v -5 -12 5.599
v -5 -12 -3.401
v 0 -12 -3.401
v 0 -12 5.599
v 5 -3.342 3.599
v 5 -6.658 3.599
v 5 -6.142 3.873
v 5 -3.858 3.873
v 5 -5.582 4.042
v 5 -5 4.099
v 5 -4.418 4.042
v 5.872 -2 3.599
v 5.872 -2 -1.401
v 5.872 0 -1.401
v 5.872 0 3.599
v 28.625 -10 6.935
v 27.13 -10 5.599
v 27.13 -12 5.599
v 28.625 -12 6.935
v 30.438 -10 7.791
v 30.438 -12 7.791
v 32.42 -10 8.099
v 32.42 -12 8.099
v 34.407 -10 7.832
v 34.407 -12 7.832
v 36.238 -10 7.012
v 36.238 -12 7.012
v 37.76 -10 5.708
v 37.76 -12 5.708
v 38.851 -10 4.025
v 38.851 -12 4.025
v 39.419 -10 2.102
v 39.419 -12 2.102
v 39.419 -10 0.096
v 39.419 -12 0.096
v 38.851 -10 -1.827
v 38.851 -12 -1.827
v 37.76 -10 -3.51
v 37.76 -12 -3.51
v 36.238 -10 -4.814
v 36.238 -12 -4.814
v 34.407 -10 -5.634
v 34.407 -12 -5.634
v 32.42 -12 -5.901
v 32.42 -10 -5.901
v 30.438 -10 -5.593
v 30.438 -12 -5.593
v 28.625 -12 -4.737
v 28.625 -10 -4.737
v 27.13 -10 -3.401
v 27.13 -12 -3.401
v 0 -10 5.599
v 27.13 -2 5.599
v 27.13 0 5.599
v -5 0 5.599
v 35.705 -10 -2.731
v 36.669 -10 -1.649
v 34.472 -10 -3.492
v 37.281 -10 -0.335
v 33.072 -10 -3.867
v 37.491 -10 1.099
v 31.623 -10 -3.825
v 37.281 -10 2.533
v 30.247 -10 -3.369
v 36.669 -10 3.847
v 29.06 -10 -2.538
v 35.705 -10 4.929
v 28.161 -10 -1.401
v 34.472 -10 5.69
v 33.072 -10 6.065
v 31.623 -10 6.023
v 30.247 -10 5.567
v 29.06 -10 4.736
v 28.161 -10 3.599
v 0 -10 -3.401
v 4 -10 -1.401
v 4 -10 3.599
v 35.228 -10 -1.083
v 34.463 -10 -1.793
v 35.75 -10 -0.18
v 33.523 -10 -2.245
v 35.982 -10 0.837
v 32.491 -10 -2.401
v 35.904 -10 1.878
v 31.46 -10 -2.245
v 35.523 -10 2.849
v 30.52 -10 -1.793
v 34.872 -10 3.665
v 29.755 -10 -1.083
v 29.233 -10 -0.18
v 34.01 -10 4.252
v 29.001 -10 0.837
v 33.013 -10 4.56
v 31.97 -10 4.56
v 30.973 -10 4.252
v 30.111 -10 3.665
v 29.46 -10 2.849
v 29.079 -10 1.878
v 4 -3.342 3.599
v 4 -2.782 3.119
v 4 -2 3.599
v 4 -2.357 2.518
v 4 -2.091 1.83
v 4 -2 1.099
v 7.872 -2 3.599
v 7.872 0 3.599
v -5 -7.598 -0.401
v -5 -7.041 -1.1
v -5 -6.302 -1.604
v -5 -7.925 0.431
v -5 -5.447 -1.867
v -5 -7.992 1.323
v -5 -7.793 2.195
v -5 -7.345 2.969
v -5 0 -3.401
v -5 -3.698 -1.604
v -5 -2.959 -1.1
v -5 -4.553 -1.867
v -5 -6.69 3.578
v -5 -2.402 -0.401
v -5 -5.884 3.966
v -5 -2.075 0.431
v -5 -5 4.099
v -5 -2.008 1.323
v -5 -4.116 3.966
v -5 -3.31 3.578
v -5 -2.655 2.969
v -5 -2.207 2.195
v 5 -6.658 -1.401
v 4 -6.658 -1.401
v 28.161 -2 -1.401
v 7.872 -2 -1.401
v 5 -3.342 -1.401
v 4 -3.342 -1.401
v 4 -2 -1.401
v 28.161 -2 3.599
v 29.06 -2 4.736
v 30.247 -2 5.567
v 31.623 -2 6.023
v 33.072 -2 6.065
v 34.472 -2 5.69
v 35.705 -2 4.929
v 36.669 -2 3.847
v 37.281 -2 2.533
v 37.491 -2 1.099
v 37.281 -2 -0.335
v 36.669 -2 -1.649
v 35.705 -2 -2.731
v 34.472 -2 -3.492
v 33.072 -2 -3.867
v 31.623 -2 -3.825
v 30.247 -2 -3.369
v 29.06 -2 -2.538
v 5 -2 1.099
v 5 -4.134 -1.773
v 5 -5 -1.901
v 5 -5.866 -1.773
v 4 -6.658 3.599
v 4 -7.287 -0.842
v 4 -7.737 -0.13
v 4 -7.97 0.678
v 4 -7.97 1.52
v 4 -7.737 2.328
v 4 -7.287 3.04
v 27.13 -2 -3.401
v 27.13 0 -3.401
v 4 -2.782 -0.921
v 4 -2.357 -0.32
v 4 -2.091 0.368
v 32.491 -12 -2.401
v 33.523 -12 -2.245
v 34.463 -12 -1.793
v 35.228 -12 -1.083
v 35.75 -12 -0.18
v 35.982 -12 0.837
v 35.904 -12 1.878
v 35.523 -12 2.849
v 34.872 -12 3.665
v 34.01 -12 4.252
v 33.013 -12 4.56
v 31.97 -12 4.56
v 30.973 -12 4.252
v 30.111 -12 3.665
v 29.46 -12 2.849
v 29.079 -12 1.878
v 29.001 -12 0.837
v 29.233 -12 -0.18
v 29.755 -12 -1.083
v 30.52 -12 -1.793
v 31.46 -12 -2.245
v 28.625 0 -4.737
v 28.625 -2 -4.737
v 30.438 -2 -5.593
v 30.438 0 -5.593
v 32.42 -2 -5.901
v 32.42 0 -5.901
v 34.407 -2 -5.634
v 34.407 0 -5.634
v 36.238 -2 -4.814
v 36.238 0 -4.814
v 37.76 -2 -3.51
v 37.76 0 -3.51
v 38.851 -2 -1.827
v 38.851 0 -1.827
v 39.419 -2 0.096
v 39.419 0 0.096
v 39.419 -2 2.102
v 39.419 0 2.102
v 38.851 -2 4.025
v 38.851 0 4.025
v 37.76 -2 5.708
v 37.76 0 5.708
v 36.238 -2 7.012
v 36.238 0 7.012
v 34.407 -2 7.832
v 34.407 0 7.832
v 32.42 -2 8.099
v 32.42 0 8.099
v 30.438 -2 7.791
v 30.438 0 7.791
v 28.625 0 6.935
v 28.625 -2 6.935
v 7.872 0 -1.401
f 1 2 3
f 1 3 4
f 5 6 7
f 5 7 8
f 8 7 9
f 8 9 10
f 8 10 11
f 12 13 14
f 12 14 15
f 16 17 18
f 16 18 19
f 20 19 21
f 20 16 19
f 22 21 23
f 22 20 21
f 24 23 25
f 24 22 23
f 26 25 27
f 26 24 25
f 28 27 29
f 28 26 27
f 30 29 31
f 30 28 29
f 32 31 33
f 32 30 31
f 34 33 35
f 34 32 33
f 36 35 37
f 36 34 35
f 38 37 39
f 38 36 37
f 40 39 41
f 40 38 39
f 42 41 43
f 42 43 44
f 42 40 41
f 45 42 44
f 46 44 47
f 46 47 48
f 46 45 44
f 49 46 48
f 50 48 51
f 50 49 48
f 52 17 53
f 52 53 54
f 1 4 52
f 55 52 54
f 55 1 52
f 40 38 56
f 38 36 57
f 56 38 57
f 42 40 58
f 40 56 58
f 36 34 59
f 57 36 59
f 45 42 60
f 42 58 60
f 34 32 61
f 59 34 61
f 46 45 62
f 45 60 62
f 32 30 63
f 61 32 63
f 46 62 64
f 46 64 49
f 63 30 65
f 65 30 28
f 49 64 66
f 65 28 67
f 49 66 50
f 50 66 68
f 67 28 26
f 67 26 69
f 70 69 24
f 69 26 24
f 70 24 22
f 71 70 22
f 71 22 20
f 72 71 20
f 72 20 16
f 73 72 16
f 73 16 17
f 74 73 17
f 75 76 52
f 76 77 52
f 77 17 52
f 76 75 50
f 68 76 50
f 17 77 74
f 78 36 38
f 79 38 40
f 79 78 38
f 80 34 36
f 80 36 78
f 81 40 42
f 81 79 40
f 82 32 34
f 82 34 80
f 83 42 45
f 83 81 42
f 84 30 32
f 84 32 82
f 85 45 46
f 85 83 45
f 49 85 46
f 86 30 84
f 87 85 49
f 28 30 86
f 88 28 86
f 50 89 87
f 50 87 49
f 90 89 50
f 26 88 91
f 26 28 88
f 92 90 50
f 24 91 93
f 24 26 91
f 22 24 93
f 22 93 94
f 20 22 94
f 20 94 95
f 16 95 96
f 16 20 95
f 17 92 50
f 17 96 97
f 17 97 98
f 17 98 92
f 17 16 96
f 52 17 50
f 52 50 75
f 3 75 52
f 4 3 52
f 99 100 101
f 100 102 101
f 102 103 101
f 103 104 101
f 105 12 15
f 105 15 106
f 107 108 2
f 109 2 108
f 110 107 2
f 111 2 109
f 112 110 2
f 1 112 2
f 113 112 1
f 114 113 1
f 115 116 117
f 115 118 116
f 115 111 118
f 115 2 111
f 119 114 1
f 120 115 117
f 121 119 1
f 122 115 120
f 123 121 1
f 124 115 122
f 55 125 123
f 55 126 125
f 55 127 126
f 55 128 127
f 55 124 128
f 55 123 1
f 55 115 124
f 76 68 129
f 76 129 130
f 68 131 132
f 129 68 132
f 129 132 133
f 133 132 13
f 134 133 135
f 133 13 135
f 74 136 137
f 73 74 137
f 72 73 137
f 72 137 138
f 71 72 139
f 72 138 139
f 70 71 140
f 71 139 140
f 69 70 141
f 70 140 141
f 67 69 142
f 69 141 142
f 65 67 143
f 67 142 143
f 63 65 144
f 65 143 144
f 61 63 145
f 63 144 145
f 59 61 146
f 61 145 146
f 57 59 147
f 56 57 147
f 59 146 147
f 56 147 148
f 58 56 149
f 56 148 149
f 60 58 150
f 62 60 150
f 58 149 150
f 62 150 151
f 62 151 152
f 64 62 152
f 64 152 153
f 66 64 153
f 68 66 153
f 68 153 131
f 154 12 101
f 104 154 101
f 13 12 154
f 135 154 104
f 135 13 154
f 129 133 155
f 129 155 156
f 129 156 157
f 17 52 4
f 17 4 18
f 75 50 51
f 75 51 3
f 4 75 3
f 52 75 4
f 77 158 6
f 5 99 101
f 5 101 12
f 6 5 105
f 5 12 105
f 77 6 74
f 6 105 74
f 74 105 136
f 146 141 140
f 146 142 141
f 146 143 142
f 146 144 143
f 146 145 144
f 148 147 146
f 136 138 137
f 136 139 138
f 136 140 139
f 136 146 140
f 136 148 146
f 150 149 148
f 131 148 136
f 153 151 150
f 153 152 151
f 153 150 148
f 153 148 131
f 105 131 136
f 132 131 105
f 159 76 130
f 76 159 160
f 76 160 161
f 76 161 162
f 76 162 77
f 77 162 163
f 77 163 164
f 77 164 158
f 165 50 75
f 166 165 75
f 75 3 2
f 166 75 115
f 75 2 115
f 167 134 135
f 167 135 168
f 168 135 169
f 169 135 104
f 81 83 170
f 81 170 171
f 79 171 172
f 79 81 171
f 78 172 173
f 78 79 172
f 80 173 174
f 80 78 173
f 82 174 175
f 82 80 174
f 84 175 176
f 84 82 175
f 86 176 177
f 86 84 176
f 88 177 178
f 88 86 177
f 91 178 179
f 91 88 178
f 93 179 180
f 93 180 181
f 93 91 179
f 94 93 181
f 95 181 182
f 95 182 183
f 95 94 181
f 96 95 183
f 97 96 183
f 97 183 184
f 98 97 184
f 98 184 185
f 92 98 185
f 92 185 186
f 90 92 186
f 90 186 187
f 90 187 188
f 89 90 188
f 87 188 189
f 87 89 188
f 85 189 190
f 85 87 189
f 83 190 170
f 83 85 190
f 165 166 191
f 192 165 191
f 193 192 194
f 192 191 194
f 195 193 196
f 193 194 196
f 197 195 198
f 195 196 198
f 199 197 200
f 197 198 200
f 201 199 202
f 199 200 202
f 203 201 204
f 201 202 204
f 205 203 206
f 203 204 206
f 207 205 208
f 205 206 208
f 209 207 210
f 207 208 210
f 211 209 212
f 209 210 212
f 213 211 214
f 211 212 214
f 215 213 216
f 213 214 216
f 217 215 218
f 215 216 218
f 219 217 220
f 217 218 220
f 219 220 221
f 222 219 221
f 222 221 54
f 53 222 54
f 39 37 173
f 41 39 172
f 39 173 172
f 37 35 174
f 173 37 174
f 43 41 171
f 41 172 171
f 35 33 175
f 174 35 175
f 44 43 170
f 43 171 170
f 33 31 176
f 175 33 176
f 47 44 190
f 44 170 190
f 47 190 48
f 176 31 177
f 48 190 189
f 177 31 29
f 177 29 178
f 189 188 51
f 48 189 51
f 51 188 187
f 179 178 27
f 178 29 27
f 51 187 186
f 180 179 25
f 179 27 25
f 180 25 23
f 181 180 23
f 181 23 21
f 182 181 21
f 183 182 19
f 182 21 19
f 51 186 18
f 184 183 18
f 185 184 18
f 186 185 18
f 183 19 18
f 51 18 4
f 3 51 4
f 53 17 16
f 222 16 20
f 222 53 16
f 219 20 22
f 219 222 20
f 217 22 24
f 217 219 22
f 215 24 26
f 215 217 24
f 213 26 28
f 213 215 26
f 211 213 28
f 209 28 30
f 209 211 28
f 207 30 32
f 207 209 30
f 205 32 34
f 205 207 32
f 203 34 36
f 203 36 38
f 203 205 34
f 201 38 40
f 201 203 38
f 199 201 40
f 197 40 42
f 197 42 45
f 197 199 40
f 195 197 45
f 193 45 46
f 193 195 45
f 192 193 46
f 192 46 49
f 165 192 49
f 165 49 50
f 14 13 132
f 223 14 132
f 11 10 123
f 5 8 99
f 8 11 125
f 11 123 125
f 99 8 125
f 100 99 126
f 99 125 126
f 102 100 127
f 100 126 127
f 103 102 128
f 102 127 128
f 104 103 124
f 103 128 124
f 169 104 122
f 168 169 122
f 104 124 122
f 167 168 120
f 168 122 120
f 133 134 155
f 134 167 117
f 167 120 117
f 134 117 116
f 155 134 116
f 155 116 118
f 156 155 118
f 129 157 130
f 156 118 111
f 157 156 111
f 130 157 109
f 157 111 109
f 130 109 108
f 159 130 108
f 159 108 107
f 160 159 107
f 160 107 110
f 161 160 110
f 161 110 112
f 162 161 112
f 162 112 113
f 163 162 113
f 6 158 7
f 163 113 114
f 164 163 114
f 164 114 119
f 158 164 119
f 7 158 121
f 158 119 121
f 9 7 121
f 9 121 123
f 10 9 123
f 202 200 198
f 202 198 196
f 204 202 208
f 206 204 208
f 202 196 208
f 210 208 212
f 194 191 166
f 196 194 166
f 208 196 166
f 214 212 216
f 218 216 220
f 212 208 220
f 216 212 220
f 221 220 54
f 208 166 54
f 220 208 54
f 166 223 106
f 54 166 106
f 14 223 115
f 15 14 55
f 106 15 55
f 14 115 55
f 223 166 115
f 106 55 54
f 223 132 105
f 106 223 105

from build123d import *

# Parameters (mm, degrees)
BOSS_EXTRUDE1_DEPTH = 2
BOSS_EXTRUDE2_DEPTH = 8
SKETCH3_R           = 3
CUT_EXTRUDE1_DEPTH  = 5
SKETCH4_W           = 2
SKETCH4_H           = 5
CUT_EXTRUDE2_DEPTH  = 5
BOSS_EXTRUDE3_START = 5
SKETCH5_W           = 9
SKETCH5_H           = 12
SKETCH5_R           = 3
BOSS_EXTRUDE3_DEPTH = 5
SKETCH6_R           = 3.5
BOSS_EXTRUDE4_DEPTH = 2


with BuildPart() as part:
    # Sketch1 → Boss-Extrude1 (new body)
    with BuildSketch(Plane(origin=(0, 0, 0), x_dir=(1, 0, 0), z_dir=(0, 1, 0))):
        with BuildLine():
            Line((0, 3.400993316), (27.129560965, 3.400993316))
            ThreePointArc((27.129560965, 3.400993316), (39.491463612, -1.099006684), (27.129560965, -5.599006684))
            Line((27.129560965, -5.599006684), (0, -5.599006684))
            Line((0, -5.599006684), (0, 3.400993316))
        make_face()
    extrude(amount=-BOSS_EXTRUDE1_DEPTH)

    # Sketch2 → Boss-Extrude2 (add)
    with BuildSketch(Plane.XZ.offset(2)):
        with BuildLine():
            Line((0, 5.599006684), (27.129560965, 5.599006684))
            ThreePointArc((27.129560965, 5.599006684), (39.491463612, 1.099006684), (27.129560965, -3.400993316))
            Line((27.129560965, -3.400993316), (0, -3.400993316))
            Line((0, -3.400993316), (0, 5.599006684))
        make_face()
        with BuildLine():
            Line((4, 3.599006684), (28.161336593, 3.599006684))
            ThreePointArc((28.161336593, 3.599006684), (37.491463612, 1.099006684), (28.161336593, -1.400993316))
            Line((28.161336593, -1.400993316), (4, -1.400993316))
            Line((4, -1.400993316), (4, 3.599006684))
        make_face(mode=Mode.SUBTRACT)
    extrude(amount=BOSS_EXTRUDE2_DEPTH)

    # Sketch3 → Cut-Extrude1 (cut)
    with BuildSketch(Plane.ZY):
        with Locations((1.099006684, -5)):
            Circle(SKETCH3_R)
    extrude(amount=-CUT_EXTRUDE1_DEPTH, mode=Mode.SUBTRACT)

    # Sketch4 → Cut-Extrude2 (cut)
    with BuildSketch(Plane.XZ.offset(2)):
        with Locations((6.871712495, 1.099006684)):
            Rectangle(SKETCH4_W, SKETCH4_H)
    extrude(amount=-CUT_EXTRUDE2_DEPTH, mode=Mode.SUBTRACT)

    # Sketch5 → Boss-Extrude3 (add)
    with BuildSketch(Plane.ZY.offset(BOSS_EXTRUDE3_START)):
        with Locations((1.099006684, -6)):
            Rectangle(SKETCH5_W, SKETCH5_H)
        with Locations((1.099006684, -5)):
            Circle(SKETCH5_R, mode=Mode.SUBTRACT)
    extrude(amount=-BOSS_EXTRUDE3_DEPTH)


with BuildPart() as body_2:
    # Sketch6 → Boss-Extrude4 (new body)
    with BuildSketch(Plane.XZ.offset(10)):
        with BuildLine():
            Line((0, 5.599006684), (27.129560965, 5.599006684))
            ThreePointArc((27.129560965, 5.599006684), (39.491463612, 1.099006684), (27.129560965, -3.400993316))
            Line((27.129560965, -3.400993316), (0, -3.400993316))
            Line((0, -3.400993316), (0, 5.599006684))
        make_face()
        with Locations(Location((32.491463612, 1.099006684, 0), (0, 0, 270))):
            Circle(SKETCH6_R, mode=Mode.SUBTRACT)
    extrude(amount=BOSS_EXTRUDE4_DEPTH)


solid = Compound([part.part, body_2.part])
